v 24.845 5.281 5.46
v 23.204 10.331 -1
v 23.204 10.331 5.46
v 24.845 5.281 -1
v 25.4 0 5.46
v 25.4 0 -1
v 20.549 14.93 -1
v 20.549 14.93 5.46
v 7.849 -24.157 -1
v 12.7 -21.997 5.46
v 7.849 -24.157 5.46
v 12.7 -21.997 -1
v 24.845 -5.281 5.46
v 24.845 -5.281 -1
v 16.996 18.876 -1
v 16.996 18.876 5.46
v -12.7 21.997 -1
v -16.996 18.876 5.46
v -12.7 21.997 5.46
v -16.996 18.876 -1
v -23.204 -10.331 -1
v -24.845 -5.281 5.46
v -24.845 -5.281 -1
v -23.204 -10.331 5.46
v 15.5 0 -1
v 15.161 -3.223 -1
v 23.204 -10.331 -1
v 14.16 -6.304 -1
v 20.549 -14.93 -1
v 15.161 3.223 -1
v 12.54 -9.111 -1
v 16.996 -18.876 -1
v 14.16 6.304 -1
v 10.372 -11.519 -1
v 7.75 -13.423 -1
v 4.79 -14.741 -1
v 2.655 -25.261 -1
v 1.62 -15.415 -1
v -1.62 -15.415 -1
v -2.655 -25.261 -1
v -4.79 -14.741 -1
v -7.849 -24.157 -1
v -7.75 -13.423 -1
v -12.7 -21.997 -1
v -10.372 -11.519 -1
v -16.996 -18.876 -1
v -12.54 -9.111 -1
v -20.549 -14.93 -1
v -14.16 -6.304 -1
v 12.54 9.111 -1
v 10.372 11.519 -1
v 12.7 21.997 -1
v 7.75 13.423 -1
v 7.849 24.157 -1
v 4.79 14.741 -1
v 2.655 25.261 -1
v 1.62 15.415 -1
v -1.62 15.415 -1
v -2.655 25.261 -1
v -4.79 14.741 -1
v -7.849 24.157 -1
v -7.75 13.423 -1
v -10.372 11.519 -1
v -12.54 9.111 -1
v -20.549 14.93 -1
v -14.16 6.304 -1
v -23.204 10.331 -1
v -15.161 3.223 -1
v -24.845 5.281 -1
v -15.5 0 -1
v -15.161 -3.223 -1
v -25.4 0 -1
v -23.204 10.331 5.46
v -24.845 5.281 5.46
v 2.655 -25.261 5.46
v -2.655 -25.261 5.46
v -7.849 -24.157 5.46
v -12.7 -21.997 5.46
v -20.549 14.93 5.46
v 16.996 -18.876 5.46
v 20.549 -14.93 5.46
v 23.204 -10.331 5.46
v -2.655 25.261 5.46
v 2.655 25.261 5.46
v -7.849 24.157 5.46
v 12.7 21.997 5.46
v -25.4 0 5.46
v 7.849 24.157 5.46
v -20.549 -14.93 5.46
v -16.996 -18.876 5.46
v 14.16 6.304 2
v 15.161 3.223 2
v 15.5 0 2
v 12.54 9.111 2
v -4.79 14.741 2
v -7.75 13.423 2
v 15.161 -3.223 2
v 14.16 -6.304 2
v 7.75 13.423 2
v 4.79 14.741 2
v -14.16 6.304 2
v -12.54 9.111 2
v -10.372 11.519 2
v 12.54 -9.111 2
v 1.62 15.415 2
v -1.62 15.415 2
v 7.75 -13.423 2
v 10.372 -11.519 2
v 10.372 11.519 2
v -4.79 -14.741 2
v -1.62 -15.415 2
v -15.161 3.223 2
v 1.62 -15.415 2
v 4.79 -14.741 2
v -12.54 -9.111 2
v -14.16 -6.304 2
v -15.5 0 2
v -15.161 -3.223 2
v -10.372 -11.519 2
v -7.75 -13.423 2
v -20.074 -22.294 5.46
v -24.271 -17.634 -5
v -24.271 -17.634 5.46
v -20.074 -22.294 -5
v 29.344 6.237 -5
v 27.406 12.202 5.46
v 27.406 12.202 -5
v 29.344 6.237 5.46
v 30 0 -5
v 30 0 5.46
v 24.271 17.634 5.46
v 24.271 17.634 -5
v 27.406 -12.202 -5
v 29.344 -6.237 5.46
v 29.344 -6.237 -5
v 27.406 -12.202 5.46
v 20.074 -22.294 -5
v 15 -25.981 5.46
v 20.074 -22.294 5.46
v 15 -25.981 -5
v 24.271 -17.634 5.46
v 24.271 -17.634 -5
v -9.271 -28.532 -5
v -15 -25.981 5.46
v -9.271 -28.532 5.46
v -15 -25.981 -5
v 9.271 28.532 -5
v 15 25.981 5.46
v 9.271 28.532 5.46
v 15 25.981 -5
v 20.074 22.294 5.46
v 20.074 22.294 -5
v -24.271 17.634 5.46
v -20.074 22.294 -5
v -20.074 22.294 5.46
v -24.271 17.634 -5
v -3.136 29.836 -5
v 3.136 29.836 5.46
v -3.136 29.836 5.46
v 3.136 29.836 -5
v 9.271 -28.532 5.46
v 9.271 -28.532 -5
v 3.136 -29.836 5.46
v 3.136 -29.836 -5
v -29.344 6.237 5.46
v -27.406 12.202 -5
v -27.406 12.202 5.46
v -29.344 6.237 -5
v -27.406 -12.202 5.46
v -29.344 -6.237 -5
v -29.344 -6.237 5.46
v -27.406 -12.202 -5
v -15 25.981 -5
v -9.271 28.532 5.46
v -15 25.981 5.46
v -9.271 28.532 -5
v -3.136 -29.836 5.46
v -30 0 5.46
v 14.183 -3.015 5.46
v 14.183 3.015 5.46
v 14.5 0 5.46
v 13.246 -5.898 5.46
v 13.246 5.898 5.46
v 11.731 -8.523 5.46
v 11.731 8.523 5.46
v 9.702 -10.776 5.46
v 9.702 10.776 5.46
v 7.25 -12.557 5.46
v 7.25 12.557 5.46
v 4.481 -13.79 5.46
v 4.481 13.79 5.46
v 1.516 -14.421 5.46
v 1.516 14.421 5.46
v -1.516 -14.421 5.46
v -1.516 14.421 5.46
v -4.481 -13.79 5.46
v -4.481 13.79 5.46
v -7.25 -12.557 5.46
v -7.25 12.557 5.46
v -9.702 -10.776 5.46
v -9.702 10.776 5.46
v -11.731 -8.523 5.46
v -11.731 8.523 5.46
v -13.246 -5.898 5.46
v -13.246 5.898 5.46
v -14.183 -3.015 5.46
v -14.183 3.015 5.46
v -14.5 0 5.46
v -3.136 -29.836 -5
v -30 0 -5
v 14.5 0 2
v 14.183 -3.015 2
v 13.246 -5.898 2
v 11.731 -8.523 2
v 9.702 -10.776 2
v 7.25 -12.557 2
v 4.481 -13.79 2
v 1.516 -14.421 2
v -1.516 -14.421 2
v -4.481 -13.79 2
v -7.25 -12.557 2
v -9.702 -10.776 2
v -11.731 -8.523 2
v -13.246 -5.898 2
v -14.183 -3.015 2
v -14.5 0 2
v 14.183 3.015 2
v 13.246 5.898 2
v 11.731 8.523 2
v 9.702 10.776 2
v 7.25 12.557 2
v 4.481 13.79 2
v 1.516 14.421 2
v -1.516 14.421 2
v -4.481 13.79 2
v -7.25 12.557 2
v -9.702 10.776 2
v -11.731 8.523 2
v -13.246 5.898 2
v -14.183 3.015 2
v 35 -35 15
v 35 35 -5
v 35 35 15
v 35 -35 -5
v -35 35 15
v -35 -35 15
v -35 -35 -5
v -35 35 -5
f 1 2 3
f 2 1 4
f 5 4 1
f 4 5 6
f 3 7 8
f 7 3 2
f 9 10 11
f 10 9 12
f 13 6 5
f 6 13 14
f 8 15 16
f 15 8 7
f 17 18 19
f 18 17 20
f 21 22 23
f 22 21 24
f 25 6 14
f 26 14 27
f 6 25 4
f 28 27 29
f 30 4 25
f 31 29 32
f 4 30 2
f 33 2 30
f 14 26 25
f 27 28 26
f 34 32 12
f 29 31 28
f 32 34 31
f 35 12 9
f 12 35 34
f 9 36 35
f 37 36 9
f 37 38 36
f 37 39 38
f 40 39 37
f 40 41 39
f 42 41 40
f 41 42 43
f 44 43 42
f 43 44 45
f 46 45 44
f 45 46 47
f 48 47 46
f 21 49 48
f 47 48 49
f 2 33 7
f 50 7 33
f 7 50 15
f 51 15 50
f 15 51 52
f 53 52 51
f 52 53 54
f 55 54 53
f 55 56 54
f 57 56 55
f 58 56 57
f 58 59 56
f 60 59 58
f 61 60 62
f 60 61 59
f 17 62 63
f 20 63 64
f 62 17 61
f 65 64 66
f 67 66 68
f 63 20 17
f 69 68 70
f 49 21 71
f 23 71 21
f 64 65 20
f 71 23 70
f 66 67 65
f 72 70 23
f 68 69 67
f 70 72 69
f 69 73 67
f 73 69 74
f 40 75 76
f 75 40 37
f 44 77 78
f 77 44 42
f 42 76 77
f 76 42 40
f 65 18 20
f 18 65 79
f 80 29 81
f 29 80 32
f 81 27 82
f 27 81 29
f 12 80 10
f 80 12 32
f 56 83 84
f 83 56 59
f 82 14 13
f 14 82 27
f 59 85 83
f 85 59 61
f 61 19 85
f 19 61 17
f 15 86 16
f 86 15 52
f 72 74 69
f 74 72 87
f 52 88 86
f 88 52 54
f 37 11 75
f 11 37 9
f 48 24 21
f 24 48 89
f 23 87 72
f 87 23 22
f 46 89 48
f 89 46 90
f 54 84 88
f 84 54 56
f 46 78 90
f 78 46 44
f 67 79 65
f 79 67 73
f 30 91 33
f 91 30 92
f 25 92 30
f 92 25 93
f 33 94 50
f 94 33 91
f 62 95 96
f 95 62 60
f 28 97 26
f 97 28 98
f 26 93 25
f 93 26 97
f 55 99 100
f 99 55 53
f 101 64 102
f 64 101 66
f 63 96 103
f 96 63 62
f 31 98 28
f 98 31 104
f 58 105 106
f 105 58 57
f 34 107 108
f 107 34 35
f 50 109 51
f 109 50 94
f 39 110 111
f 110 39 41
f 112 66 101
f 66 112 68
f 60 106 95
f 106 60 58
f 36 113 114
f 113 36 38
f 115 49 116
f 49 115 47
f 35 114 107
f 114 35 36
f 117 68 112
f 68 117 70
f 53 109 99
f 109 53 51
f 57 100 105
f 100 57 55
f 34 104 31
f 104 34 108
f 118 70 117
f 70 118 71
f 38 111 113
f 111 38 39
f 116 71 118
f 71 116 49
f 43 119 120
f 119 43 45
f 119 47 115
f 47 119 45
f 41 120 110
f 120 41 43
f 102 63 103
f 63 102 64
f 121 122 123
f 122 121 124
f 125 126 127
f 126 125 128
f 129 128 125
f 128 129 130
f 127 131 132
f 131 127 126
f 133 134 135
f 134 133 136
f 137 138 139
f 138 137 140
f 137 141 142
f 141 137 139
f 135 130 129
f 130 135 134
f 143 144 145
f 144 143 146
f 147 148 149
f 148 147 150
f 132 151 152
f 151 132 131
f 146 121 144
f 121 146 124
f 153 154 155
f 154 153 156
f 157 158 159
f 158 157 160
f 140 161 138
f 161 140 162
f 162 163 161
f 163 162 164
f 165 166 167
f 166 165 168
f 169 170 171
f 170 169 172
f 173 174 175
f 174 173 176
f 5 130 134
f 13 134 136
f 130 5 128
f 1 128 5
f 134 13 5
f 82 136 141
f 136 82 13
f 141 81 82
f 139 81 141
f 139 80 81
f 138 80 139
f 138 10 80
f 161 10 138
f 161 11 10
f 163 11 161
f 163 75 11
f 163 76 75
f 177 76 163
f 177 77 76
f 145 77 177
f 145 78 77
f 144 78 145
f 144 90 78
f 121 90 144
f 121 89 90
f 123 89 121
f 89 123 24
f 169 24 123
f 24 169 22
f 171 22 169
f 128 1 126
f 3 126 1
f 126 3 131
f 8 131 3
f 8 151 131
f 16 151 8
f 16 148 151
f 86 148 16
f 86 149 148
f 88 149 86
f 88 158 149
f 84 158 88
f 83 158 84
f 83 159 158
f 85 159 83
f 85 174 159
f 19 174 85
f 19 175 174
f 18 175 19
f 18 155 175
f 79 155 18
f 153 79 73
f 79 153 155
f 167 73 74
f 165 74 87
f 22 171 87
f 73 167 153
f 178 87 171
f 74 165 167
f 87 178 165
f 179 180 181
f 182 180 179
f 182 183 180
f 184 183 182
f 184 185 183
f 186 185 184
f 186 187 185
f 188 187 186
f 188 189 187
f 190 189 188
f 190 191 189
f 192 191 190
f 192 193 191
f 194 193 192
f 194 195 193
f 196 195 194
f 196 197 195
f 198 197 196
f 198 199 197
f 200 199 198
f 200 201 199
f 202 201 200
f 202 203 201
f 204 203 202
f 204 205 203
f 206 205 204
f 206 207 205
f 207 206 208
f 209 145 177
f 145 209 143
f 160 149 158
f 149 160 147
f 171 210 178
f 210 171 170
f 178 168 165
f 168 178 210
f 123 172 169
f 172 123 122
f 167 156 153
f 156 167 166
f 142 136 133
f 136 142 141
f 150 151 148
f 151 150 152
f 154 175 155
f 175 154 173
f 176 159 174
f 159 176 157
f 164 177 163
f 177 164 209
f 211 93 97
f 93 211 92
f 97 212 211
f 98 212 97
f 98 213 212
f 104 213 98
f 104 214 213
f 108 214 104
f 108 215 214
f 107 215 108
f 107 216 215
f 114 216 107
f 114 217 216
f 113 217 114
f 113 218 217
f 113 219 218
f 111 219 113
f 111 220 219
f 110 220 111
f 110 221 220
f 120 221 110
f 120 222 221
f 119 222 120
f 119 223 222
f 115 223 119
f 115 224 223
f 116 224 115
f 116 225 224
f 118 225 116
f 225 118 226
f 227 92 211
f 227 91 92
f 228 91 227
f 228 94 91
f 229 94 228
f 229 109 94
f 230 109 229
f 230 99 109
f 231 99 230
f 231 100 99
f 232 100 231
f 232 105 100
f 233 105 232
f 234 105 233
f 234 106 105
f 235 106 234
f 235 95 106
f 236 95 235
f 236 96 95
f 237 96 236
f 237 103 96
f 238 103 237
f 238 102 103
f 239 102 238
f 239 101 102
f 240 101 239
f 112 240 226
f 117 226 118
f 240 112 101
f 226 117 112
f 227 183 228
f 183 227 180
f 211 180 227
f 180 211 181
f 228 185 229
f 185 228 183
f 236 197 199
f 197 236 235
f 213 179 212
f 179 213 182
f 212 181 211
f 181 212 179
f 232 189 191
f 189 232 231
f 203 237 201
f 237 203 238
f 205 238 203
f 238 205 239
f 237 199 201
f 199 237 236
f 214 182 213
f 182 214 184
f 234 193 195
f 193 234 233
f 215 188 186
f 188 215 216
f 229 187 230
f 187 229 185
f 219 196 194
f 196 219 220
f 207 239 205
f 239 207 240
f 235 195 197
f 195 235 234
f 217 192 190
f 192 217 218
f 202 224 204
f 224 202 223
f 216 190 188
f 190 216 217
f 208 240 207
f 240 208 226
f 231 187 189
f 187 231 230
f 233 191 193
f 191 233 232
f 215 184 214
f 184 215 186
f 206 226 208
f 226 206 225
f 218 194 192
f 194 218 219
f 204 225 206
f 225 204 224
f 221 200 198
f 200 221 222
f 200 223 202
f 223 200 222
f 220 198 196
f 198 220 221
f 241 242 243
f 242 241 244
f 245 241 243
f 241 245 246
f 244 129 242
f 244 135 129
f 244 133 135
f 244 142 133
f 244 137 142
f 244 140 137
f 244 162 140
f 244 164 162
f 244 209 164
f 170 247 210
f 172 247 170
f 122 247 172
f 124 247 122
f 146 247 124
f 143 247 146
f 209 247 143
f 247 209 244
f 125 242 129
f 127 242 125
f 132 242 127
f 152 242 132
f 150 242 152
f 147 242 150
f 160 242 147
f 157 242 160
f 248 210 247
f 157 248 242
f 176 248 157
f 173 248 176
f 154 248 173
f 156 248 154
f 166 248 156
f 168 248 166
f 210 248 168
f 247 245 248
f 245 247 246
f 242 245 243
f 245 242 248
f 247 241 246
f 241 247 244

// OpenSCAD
difference()
    {
        translate([0,0,5]) {
         cube([70, 70, 20],center=true);
        }


//thing being subtracted 
difference()
  {
  difference()
    {
        cylinder(h=10.92, r1=30, r2=30,center=true);
        translate([0,0,14]) {
        difference()
            {
            cylinder(30,r1=25.4,r2=25.4,center=true);
            cylinder(60,r1=15.5,r2=15.5,center=true);   
            }
        }
}
   translate([0,0,23]) {
  difference()
 {
    cylinder(42,r1=25.4,r2=25.4,center=true);
    cylinder(60,r1=14.5,r2=14.5,center=true);   
 }
}
}
}



 
 
 
